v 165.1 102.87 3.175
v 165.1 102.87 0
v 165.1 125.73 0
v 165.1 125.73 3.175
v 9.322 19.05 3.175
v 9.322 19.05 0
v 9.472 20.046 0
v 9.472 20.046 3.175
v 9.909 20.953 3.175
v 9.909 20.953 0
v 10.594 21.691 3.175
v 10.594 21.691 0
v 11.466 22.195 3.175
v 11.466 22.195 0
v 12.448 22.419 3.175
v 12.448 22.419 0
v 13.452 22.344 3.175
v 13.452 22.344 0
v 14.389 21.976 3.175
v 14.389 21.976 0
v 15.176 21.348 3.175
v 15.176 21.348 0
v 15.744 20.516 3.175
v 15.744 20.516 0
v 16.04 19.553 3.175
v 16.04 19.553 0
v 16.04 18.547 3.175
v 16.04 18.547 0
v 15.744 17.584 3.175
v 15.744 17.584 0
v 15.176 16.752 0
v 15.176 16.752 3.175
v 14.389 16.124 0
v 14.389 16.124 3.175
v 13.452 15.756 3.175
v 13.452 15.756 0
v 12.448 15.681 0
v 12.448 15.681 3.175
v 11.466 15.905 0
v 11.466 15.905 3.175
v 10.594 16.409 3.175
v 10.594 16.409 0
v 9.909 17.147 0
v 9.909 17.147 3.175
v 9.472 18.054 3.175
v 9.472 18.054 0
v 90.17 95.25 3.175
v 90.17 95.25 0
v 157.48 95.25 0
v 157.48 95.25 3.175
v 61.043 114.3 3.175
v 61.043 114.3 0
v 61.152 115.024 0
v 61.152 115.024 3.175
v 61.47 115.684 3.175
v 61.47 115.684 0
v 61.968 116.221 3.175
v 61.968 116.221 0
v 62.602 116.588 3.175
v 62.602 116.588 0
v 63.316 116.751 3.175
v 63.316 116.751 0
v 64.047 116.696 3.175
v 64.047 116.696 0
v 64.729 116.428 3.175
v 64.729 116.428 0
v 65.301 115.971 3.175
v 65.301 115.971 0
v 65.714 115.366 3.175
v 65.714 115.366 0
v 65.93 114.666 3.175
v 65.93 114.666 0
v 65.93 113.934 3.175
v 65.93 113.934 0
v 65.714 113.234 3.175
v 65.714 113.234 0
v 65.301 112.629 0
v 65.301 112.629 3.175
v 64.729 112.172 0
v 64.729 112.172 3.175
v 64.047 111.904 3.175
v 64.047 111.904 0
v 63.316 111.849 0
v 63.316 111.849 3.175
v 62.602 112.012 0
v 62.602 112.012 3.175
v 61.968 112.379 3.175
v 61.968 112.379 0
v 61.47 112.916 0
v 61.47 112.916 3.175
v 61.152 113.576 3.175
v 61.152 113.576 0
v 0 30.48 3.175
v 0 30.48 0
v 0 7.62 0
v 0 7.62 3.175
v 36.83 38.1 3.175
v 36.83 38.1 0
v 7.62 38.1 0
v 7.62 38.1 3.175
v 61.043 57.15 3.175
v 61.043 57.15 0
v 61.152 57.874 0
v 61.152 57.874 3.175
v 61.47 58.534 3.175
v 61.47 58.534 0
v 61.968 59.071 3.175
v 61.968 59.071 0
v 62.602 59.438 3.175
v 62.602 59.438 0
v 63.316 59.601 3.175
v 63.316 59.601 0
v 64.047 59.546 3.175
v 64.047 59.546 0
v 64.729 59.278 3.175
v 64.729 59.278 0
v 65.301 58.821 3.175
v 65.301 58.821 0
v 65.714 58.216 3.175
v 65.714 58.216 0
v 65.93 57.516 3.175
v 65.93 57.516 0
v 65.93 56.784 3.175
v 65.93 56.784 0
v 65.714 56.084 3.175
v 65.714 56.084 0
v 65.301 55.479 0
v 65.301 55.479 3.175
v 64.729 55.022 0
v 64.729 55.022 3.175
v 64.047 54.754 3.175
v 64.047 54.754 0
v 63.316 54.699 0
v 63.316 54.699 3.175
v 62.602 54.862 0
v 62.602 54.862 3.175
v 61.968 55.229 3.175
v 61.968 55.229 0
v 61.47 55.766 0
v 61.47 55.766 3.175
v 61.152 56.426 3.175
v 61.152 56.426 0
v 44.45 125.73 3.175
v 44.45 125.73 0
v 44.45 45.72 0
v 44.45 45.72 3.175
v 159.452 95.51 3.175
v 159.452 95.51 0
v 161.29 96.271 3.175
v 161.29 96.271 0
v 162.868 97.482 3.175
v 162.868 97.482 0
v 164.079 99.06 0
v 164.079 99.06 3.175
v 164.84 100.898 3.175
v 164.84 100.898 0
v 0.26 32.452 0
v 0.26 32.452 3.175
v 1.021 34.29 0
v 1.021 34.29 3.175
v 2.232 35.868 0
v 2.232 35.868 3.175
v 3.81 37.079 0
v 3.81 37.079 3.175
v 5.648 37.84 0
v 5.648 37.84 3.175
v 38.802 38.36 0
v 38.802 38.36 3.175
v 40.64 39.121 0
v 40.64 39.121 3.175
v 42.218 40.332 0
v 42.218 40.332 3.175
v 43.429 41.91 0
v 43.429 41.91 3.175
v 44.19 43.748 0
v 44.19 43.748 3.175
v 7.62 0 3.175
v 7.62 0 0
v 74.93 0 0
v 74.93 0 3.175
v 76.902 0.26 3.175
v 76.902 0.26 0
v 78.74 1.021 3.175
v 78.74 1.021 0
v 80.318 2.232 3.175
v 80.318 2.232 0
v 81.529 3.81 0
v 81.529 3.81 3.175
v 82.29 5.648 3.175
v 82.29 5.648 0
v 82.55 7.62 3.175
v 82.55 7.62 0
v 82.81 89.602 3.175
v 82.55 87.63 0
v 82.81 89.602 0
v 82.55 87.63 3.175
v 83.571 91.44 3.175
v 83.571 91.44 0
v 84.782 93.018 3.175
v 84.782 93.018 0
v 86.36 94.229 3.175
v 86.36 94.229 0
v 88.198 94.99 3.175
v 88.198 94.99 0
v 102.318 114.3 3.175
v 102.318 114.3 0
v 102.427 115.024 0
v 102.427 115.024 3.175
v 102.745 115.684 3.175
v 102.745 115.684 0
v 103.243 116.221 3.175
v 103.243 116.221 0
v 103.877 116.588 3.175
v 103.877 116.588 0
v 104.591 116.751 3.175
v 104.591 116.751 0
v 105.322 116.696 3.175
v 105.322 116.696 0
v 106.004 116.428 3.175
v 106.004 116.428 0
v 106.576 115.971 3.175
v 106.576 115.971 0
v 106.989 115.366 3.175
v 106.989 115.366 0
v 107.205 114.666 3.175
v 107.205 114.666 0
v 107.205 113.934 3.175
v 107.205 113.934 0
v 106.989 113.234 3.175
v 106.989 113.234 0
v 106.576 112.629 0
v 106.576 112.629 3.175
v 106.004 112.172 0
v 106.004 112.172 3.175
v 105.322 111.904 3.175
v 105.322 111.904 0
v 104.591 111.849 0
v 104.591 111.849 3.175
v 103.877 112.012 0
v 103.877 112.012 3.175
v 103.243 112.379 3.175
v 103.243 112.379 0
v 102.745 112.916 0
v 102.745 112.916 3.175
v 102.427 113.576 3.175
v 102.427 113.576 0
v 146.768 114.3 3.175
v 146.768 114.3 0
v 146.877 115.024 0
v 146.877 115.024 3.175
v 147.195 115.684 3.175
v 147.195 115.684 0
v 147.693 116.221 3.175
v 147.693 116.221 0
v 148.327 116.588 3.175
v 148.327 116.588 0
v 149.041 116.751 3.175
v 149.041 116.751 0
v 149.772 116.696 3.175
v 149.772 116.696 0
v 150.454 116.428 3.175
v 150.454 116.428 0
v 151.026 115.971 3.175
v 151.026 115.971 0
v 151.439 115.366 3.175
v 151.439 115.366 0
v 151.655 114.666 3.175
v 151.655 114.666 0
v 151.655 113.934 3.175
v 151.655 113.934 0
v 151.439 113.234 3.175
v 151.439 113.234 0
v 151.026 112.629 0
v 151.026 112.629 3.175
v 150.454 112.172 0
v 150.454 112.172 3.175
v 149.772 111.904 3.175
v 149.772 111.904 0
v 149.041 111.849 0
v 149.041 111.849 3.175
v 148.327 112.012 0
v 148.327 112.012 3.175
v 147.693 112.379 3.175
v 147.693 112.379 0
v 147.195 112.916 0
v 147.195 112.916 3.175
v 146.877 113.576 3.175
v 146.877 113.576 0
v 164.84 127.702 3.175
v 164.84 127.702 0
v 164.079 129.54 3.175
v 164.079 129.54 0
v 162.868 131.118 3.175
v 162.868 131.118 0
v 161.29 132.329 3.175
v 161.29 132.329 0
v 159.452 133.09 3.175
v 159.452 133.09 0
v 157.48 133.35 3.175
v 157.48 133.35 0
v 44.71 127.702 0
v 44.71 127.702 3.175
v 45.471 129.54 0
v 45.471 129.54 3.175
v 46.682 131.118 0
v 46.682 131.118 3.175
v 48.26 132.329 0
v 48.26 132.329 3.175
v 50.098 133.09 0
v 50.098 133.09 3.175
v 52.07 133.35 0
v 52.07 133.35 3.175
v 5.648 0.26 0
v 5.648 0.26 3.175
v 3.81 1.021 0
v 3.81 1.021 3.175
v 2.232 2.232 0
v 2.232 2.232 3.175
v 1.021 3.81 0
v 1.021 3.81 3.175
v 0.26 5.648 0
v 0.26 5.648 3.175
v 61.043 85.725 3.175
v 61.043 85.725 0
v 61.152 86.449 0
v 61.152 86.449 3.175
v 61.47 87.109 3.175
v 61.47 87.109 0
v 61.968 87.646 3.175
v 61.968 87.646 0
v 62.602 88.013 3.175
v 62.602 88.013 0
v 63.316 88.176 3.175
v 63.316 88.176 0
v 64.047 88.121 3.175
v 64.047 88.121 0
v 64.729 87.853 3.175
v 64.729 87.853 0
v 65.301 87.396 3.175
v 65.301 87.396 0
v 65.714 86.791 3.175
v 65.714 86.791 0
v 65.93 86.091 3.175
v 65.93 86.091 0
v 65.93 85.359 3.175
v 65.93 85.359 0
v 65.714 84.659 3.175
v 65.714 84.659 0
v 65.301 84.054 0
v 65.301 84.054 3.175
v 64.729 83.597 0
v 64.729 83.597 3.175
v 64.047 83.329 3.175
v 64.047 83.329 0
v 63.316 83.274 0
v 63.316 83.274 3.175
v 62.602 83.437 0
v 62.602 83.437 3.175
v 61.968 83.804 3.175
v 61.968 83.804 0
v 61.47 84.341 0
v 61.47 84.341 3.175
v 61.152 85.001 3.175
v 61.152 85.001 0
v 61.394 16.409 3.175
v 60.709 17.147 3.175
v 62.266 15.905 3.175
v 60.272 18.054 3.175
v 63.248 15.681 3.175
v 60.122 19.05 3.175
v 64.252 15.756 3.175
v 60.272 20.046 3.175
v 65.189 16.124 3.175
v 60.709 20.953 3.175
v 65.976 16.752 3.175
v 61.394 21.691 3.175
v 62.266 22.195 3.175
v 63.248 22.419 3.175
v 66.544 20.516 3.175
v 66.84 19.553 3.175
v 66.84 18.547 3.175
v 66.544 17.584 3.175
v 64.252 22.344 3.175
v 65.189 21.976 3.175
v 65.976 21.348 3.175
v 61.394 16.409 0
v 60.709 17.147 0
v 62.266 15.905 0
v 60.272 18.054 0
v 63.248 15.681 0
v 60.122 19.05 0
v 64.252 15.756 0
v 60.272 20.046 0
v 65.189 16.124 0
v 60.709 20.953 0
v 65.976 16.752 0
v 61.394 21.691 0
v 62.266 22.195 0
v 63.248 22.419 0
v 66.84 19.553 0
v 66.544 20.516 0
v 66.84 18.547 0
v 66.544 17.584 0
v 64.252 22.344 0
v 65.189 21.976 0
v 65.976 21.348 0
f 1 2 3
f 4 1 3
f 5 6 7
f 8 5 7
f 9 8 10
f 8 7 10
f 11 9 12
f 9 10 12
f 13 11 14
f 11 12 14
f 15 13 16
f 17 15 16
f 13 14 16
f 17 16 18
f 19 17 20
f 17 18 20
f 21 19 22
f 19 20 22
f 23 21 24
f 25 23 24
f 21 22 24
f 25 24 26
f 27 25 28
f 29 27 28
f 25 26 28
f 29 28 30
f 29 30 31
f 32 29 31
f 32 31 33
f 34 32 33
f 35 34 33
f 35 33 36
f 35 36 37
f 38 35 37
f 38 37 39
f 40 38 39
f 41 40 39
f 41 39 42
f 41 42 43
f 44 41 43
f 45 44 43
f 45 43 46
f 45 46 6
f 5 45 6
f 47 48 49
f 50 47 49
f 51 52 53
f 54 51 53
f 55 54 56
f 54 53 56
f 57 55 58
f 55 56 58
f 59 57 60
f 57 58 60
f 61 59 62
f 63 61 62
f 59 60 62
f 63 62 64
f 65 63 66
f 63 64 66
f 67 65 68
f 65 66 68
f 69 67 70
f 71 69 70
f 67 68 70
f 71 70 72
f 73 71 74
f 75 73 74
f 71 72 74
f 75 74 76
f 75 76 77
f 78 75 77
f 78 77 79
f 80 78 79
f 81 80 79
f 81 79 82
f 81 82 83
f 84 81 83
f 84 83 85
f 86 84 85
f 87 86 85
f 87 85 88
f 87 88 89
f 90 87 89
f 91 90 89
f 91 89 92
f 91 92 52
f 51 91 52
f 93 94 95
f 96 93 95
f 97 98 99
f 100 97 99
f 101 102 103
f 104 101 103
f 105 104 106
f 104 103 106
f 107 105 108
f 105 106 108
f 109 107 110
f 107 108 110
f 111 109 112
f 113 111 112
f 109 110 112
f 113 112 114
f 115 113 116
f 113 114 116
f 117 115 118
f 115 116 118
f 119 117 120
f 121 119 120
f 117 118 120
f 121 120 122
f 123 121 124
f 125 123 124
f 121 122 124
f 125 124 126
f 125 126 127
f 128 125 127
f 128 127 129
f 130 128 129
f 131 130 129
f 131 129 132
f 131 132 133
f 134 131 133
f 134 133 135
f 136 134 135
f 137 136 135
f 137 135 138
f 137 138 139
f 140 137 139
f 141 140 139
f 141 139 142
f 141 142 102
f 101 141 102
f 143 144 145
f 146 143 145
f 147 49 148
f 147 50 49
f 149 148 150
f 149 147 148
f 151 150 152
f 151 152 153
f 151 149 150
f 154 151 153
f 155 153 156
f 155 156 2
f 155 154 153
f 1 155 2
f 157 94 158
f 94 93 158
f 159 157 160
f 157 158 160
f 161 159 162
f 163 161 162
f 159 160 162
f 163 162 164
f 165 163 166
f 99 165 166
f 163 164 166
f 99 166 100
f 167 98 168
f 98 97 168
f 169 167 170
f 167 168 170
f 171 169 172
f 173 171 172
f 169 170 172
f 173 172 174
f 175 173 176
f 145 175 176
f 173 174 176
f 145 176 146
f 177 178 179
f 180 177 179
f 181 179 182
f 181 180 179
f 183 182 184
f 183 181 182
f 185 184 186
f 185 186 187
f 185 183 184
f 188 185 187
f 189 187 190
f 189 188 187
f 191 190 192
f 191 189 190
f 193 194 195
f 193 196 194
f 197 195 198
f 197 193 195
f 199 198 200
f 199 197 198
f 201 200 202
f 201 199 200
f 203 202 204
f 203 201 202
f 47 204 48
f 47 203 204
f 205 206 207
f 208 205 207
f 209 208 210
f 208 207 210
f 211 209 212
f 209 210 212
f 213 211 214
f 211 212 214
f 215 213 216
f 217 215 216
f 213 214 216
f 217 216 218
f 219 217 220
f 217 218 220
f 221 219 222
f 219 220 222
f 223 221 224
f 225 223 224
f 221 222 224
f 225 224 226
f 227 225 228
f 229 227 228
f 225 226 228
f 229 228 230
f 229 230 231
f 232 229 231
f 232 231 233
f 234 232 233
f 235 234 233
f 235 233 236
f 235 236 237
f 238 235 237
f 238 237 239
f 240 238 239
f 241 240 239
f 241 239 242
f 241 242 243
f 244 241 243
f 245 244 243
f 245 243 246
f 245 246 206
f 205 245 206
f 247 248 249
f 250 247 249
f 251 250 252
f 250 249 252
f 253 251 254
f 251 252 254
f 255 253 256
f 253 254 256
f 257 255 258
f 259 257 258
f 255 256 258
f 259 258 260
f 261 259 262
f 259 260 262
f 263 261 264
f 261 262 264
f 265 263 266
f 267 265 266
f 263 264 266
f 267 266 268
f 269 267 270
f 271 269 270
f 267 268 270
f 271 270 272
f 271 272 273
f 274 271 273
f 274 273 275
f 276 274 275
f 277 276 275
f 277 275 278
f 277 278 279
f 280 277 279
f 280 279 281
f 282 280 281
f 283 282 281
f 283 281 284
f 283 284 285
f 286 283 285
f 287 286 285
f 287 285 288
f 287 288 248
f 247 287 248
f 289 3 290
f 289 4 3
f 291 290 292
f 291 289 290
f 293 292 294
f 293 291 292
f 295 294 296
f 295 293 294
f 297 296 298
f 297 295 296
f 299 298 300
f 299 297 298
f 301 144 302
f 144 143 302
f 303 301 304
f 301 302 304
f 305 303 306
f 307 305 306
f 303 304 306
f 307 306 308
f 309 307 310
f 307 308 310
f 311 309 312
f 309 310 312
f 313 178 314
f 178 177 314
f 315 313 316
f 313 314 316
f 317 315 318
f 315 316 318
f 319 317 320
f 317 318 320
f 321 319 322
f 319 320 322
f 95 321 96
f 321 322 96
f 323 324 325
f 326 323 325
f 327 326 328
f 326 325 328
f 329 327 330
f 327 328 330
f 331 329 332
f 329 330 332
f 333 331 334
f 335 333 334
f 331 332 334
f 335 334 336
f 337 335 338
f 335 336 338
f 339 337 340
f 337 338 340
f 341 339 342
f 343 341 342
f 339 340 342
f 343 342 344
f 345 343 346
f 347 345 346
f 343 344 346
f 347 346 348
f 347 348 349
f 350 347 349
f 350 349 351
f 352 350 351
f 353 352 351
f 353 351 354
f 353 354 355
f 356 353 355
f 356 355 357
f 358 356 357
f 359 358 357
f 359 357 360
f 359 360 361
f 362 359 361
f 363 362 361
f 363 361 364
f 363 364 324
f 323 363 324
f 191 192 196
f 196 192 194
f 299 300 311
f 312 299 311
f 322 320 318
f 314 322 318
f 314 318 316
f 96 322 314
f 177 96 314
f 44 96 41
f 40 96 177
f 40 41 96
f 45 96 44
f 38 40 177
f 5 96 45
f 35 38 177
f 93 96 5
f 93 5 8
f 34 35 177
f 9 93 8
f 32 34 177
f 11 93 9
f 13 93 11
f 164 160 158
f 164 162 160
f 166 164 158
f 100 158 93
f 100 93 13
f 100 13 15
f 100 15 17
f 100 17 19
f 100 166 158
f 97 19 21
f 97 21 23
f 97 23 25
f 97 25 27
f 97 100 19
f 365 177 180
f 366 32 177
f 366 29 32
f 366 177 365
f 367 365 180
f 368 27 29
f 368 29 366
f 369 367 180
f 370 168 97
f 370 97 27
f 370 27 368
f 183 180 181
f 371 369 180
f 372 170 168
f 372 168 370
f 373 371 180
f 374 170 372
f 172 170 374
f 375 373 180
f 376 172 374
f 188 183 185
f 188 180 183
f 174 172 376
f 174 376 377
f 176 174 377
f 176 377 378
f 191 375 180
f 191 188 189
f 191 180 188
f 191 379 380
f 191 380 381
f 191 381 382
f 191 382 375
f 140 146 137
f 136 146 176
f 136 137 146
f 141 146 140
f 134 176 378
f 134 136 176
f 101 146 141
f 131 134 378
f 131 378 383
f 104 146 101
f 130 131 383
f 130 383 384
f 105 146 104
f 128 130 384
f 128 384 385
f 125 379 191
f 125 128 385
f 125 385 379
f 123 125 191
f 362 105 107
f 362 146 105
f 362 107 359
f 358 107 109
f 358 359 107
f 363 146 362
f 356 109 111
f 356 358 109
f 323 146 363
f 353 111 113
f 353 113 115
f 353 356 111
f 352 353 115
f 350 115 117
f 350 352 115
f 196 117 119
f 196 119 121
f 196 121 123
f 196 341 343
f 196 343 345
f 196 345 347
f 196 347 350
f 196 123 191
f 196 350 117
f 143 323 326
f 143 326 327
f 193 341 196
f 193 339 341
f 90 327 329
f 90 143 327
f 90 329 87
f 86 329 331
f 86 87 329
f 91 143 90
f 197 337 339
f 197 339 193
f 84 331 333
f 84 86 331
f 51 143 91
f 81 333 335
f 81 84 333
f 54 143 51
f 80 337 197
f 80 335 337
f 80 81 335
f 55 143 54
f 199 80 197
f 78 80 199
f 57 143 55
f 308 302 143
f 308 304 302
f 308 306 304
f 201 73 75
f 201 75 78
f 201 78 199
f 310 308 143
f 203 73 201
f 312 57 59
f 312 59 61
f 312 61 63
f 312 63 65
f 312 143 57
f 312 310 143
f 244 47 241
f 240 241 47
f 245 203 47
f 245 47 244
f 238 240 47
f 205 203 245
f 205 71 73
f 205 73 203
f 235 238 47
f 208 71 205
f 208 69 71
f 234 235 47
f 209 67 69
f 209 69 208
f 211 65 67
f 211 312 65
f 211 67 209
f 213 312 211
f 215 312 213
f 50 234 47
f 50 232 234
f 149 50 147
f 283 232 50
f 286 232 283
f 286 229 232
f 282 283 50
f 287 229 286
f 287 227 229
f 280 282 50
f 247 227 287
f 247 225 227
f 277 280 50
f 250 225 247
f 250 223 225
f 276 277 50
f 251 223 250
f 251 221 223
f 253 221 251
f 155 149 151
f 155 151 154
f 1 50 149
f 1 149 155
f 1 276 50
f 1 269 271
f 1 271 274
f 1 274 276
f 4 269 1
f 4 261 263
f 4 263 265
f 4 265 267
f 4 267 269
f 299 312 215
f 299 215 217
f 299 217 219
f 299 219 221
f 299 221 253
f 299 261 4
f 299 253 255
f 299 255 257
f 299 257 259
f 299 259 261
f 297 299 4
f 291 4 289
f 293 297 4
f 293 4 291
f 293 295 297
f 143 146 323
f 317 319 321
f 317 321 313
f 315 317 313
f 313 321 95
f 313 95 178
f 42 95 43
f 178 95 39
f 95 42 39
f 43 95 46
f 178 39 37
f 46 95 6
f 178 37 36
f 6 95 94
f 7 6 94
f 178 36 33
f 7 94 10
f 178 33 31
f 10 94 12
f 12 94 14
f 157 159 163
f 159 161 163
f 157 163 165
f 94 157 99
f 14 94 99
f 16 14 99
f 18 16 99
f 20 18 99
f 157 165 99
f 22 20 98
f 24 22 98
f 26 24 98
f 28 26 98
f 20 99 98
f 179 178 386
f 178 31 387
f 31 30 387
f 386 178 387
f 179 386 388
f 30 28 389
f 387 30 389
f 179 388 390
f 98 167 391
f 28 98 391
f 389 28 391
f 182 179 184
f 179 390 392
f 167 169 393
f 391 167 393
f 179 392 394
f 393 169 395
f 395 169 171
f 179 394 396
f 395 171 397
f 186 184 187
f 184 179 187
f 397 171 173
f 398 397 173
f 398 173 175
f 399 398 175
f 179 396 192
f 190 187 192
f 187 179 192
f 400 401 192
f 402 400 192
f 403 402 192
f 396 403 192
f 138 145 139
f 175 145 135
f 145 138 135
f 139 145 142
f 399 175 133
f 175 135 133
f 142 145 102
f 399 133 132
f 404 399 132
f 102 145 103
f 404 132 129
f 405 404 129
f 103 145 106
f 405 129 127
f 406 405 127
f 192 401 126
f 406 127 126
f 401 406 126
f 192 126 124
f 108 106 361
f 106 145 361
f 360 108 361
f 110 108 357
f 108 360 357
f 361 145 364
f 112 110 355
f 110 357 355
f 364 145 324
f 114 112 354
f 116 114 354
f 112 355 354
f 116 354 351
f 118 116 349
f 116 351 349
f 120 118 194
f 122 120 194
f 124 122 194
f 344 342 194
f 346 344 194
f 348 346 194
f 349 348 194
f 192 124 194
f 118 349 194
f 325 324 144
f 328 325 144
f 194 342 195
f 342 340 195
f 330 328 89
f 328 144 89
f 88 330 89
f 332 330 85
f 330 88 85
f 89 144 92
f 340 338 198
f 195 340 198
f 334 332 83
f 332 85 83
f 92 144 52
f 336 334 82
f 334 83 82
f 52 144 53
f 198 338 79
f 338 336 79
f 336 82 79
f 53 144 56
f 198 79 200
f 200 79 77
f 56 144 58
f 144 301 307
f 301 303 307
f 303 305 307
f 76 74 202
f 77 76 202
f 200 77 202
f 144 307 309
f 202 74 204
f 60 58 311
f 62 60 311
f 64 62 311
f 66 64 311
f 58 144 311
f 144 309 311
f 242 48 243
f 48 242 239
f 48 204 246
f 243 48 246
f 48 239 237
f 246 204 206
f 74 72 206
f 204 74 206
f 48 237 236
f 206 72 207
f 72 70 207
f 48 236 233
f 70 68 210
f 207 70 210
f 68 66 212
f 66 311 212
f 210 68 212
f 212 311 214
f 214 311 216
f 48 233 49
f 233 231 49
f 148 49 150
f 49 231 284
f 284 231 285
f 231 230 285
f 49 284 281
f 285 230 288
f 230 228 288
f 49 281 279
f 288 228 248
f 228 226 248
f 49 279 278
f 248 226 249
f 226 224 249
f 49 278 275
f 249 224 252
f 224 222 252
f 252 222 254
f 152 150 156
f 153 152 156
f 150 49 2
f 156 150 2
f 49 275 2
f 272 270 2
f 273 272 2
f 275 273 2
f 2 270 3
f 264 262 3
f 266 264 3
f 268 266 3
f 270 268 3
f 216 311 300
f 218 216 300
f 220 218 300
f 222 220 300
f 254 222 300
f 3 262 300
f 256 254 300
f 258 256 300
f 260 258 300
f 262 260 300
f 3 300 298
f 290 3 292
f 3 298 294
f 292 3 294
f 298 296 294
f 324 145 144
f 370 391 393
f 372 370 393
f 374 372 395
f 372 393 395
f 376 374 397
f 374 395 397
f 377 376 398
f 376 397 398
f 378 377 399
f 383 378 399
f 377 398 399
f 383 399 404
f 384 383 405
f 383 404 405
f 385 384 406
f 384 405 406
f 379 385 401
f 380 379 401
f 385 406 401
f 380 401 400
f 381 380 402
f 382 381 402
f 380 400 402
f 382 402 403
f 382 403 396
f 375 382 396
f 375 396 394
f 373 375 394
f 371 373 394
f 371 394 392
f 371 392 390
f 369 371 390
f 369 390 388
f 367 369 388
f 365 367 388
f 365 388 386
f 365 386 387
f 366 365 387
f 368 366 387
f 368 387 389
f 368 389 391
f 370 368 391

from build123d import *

# Parameters (mm, degrees)
BOSS_EXTRUDE1_DEPTH          = 3.175
F_10_0_1935_DIAMETER_HOLE1_D = 4.9149
F_1_4_CLEARANCE_HOLE2_D      = 6.7564
FILLET1_R                    = 7.62


with BuildPart() as part:
    # Sketch1 → Boss-Extrude1 (new body)
    with BuildSketch(Plane.XY):
        Polygon((0, 0), (82.55, 0), (82.55, 95.25), (165.1, 95.25), (165.1, 133.35), (44.45, 133.35), (44.45, 38.1), (0, 38.1), align=None)
    extrude(amount=BOSS_EXTRUDE1_DEPTH)

    # #10 (0.1935) Diameter Hole1 (through all)
    with Locations(Plane.XY.offset(3.175)):
        with Locations((63.5, 85.725), (63.5, 57.15), (63.5, 114.3), (149.225, 114.3), (104.775, 114.3)):
            Hole(F_10_0_1935_DIAMETER_HOLE1_D / 2)

    # 1/4 Clearance Hole2 (through all)
    with Locations(Plane.XY.offset(3.175)):
        with Locations((12.7, 19.05), (63.5, 19.05)):
            Hole(F_1_4_CLEARANCE_HOLE2_D / 2)

    # Fillet1
    fillet1_edges = [part.edges().sort_by_distance(p)[0] for p in [
        (0, 38.1, 1.5875),
        (44.45, 38.1, 1.5875),
        (44.45, 133.35, 1.5875),
        (165.1, 133.35, 1.5875),
        (165.1, 95.25, 1.5875),
        (82.55, 95.25, 1.5875),
        (82.55, 0, 1.5875),
        (0, 0, 1.5875),
    ]]
    fillet(fillet1_edges, radius=FILLET1_R)


solid = part.part
